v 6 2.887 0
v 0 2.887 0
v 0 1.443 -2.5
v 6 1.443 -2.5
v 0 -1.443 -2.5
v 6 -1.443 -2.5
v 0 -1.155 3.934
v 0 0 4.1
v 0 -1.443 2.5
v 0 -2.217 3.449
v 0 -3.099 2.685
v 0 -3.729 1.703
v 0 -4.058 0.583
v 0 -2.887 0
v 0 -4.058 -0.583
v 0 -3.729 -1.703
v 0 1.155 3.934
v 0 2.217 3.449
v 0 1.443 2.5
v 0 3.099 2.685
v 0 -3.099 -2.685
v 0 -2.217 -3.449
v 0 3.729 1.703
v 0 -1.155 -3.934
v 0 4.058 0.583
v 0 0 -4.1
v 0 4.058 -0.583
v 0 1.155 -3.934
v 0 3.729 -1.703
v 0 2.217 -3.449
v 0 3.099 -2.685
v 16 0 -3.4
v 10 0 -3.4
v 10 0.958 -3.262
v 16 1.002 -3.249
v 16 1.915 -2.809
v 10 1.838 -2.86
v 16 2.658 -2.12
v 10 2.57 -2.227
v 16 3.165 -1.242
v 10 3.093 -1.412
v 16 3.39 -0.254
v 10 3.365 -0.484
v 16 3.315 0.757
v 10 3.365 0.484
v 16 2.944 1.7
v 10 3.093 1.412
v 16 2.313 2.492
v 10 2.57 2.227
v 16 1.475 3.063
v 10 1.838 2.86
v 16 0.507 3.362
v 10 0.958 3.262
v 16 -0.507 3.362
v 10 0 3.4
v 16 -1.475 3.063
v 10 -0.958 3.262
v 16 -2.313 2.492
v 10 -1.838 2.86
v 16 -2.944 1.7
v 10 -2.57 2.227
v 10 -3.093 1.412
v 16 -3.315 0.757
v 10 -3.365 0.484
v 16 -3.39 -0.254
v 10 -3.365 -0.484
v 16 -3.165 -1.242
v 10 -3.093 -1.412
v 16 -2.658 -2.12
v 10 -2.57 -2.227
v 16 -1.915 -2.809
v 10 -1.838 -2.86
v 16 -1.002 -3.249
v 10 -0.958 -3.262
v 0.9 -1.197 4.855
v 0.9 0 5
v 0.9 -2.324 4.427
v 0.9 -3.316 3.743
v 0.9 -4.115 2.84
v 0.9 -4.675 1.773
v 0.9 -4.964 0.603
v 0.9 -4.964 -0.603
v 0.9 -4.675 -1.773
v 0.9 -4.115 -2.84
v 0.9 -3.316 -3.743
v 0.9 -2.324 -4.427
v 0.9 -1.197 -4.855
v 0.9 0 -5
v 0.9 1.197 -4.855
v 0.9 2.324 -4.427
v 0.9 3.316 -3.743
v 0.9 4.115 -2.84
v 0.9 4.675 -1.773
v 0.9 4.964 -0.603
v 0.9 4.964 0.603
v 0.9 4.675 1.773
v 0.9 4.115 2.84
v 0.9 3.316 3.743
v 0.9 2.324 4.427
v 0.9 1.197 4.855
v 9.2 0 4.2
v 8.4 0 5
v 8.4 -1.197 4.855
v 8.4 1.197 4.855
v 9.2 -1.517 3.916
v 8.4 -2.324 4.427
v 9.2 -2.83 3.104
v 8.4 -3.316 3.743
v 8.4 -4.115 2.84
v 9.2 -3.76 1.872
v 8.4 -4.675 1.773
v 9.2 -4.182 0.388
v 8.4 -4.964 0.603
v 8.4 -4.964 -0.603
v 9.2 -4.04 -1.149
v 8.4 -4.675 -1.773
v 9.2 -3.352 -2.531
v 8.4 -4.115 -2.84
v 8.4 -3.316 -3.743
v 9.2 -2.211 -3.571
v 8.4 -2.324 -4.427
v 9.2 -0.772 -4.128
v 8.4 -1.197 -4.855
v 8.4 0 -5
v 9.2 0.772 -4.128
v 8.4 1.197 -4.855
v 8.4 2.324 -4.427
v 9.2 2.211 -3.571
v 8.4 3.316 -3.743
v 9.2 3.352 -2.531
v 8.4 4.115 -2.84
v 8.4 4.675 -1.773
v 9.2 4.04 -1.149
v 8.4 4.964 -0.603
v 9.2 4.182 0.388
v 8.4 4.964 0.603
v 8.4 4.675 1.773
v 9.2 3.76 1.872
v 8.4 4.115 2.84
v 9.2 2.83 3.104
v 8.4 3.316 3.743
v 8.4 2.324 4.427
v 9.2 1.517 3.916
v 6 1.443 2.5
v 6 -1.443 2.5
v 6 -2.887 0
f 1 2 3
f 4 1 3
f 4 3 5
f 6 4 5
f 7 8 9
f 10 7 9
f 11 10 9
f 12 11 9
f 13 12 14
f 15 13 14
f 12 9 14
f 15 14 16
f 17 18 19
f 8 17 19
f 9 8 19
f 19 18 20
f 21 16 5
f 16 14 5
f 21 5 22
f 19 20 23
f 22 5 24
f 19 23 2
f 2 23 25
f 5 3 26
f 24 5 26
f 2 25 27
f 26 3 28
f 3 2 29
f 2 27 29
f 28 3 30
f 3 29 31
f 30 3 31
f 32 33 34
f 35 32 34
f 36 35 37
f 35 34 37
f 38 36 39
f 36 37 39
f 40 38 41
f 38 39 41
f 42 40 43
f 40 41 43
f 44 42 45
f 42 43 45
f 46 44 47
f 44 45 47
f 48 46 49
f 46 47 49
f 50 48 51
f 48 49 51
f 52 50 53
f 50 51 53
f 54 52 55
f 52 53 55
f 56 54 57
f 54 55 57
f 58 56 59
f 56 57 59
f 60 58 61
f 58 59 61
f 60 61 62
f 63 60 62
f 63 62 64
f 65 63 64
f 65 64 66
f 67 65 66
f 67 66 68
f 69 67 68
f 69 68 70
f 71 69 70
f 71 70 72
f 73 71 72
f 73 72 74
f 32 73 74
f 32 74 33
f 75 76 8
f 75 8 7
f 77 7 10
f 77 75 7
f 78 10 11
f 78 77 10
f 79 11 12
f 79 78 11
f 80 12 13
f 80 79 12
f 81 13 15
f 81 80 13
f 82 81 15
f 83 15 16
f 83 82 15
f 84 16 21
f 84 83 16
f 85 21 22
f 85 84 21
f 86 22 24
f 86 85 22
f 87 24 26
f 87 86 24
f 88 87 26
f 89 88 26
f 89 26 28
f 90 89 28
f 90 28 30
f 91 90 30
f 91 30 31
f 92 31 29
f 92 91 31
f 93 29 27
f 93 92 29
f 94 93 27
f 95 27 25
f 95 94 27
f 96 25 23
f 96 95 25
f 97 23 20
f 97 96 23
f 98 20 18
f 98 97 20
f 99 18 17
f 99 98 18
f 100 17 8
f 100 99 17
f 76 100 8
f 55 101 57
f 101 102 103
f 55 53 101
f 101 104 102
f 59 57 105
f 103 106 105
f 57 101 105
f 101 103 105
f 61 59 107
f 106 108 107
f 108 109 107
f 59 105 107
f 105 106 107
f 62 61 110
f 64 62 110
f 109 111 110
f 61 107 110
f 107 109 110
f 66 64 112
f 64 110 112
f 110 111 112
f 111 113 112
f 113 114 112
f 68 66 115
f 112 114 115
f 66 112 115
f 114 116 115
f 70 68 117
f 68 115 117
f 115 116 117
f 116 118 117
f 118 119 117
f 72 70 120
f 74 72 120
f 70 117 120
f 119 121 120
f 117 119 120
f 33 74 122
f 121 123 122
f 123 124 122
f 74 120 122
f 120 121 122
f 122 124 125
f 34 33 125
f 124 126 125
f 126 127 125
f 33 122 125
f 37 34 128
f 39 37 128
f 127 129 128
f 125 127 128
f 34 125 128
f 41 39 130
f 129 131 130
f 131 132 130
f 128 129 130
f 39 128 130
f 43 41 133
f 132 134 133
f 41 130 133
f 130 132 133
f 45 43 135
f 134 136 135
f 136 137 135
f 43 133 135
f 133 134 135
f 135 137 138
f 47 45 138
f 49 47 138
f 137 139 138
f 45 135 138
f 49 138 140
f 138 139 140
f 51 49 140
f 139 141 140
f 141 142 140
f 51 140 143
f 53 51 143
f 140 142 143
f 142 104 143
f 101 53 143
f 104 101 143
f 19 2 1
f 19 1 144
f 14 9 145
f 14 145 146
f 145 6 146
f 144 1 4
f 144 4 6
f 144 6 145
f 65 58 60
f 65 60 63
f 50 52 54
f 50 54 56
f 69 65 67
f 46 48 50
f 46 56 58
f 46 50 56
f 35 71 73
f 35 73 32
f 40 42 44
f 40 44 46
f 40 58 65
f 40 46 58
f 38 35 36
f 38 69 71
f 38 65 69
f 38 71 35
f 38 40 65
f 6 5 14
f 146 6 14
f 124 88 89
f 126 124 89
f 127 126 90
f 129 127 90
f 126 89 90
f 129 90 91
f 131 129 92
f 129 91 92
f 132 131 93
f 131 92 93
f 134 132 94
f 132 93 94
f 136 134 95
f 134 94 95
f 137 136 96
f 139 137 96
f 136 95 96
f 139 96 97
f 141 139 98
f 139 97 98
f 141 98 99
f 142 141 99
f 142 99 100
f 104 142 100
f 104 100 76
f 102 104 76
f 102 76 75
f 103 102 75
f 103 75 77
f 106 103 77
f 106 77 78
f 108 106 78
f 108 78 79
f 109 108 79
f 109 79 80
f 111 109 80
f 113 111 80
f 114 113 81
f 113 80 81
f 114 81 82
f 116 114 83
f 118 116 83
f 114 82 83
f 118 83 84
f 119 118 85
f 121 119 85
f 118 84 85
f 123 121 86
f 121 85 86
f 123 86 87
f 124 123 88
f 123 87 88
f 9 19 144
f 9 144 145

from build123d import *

# Parameters (mm, degrees)
SKETCH_1_R          = 5
EXTRUDE_1_DEPTH     = 16
CUT_EXTRUDE_1_DEPTH = 6
CUT_EXTRUDE_START   = -6
SKETCH_3_R          = 5
SKETCH_3_R_2        = 3.4
CUT_EXTRUDE_2_DEPTH = 6


with BuildPart() as part:
    # Эскиз1 → Вытянуть1 (new body)
    with BuildSketch(Plane(origin=(0, 0, 0), x_dir=(0, 0, -1), z_dir=(1, 0, 0))):
        Circle(SKETCH_1_R)
    extrude(amount=EXTRUDE_1_DEPTH)

    # Эскиз2 → Вырез-Вытянуть1 (cut)
    with BuildSketch(Plane.ZY):
        Polygon((-2.5, -1.443375673), (0, -2.886751346), (0, 2.886751346), (-2.5, 1.443375673), align=None)
        Polygon((0, -2.886751346), (0, 2.886751346), (2.5, 1.443375673), (2.5, -1.443375673), align=None)
    extrude(amount=-CUT_EXTRUDE_1_DEPTH, mode=Mode.SUBTRACT)

    # Эскиз3 → Вырез-Вытянуть2 (cut)
    with BuildSketch(Plane(origin=(16, 0, 0), x_dir=(0, 0, -1), z_dir=(1, 0, 0)).offset(CUT_EXTRUDE_START)):
        Circle(SKETCH_3_R)
        Circle(SKETCH_3_R_2, mode=Mode.SUBTRACT)
    extrude(amount=CUT_EXTRUDE_2_DEPTH, mode=Mode.SUBTRACT)

    # Эскиз4 → Вырез-Повернуть1 (revolve, cut)
    with BuildSketch(Plane.XY, mode=Mode.PRIVATE) as cut_revolve_1_sk:
        Polygon((10, 5), (10, 3.4), (8.4, 5), align=None)
    revolve(cut_revolve_1_sk.sketch.rotate(Axis((0, 0, 0), (1, 0, 0)), 90), axis=Axis((0, 0, 0), (1, 0, 0)), mode=Mode.SUBTRACT)

    # Эскиз5 → Вырез-Повернуть2 (revolve, cut)
    with BuildSketch(Plane.XY, mode=Mode.PRIVATE) as cut_revolve_2_sk:
        Polygon((0, 5), (0, 4.1), (0.9, 5), align=None)
    revolve(cut_revolve_2_sk.sketch.rotate(Axis((0, 0, 0), (1, 0, 0)), 90), axis=Axis((0, 0, 0), (1, 0, 0)), mode=Mode.SUBTRACT)


solid = part.part
